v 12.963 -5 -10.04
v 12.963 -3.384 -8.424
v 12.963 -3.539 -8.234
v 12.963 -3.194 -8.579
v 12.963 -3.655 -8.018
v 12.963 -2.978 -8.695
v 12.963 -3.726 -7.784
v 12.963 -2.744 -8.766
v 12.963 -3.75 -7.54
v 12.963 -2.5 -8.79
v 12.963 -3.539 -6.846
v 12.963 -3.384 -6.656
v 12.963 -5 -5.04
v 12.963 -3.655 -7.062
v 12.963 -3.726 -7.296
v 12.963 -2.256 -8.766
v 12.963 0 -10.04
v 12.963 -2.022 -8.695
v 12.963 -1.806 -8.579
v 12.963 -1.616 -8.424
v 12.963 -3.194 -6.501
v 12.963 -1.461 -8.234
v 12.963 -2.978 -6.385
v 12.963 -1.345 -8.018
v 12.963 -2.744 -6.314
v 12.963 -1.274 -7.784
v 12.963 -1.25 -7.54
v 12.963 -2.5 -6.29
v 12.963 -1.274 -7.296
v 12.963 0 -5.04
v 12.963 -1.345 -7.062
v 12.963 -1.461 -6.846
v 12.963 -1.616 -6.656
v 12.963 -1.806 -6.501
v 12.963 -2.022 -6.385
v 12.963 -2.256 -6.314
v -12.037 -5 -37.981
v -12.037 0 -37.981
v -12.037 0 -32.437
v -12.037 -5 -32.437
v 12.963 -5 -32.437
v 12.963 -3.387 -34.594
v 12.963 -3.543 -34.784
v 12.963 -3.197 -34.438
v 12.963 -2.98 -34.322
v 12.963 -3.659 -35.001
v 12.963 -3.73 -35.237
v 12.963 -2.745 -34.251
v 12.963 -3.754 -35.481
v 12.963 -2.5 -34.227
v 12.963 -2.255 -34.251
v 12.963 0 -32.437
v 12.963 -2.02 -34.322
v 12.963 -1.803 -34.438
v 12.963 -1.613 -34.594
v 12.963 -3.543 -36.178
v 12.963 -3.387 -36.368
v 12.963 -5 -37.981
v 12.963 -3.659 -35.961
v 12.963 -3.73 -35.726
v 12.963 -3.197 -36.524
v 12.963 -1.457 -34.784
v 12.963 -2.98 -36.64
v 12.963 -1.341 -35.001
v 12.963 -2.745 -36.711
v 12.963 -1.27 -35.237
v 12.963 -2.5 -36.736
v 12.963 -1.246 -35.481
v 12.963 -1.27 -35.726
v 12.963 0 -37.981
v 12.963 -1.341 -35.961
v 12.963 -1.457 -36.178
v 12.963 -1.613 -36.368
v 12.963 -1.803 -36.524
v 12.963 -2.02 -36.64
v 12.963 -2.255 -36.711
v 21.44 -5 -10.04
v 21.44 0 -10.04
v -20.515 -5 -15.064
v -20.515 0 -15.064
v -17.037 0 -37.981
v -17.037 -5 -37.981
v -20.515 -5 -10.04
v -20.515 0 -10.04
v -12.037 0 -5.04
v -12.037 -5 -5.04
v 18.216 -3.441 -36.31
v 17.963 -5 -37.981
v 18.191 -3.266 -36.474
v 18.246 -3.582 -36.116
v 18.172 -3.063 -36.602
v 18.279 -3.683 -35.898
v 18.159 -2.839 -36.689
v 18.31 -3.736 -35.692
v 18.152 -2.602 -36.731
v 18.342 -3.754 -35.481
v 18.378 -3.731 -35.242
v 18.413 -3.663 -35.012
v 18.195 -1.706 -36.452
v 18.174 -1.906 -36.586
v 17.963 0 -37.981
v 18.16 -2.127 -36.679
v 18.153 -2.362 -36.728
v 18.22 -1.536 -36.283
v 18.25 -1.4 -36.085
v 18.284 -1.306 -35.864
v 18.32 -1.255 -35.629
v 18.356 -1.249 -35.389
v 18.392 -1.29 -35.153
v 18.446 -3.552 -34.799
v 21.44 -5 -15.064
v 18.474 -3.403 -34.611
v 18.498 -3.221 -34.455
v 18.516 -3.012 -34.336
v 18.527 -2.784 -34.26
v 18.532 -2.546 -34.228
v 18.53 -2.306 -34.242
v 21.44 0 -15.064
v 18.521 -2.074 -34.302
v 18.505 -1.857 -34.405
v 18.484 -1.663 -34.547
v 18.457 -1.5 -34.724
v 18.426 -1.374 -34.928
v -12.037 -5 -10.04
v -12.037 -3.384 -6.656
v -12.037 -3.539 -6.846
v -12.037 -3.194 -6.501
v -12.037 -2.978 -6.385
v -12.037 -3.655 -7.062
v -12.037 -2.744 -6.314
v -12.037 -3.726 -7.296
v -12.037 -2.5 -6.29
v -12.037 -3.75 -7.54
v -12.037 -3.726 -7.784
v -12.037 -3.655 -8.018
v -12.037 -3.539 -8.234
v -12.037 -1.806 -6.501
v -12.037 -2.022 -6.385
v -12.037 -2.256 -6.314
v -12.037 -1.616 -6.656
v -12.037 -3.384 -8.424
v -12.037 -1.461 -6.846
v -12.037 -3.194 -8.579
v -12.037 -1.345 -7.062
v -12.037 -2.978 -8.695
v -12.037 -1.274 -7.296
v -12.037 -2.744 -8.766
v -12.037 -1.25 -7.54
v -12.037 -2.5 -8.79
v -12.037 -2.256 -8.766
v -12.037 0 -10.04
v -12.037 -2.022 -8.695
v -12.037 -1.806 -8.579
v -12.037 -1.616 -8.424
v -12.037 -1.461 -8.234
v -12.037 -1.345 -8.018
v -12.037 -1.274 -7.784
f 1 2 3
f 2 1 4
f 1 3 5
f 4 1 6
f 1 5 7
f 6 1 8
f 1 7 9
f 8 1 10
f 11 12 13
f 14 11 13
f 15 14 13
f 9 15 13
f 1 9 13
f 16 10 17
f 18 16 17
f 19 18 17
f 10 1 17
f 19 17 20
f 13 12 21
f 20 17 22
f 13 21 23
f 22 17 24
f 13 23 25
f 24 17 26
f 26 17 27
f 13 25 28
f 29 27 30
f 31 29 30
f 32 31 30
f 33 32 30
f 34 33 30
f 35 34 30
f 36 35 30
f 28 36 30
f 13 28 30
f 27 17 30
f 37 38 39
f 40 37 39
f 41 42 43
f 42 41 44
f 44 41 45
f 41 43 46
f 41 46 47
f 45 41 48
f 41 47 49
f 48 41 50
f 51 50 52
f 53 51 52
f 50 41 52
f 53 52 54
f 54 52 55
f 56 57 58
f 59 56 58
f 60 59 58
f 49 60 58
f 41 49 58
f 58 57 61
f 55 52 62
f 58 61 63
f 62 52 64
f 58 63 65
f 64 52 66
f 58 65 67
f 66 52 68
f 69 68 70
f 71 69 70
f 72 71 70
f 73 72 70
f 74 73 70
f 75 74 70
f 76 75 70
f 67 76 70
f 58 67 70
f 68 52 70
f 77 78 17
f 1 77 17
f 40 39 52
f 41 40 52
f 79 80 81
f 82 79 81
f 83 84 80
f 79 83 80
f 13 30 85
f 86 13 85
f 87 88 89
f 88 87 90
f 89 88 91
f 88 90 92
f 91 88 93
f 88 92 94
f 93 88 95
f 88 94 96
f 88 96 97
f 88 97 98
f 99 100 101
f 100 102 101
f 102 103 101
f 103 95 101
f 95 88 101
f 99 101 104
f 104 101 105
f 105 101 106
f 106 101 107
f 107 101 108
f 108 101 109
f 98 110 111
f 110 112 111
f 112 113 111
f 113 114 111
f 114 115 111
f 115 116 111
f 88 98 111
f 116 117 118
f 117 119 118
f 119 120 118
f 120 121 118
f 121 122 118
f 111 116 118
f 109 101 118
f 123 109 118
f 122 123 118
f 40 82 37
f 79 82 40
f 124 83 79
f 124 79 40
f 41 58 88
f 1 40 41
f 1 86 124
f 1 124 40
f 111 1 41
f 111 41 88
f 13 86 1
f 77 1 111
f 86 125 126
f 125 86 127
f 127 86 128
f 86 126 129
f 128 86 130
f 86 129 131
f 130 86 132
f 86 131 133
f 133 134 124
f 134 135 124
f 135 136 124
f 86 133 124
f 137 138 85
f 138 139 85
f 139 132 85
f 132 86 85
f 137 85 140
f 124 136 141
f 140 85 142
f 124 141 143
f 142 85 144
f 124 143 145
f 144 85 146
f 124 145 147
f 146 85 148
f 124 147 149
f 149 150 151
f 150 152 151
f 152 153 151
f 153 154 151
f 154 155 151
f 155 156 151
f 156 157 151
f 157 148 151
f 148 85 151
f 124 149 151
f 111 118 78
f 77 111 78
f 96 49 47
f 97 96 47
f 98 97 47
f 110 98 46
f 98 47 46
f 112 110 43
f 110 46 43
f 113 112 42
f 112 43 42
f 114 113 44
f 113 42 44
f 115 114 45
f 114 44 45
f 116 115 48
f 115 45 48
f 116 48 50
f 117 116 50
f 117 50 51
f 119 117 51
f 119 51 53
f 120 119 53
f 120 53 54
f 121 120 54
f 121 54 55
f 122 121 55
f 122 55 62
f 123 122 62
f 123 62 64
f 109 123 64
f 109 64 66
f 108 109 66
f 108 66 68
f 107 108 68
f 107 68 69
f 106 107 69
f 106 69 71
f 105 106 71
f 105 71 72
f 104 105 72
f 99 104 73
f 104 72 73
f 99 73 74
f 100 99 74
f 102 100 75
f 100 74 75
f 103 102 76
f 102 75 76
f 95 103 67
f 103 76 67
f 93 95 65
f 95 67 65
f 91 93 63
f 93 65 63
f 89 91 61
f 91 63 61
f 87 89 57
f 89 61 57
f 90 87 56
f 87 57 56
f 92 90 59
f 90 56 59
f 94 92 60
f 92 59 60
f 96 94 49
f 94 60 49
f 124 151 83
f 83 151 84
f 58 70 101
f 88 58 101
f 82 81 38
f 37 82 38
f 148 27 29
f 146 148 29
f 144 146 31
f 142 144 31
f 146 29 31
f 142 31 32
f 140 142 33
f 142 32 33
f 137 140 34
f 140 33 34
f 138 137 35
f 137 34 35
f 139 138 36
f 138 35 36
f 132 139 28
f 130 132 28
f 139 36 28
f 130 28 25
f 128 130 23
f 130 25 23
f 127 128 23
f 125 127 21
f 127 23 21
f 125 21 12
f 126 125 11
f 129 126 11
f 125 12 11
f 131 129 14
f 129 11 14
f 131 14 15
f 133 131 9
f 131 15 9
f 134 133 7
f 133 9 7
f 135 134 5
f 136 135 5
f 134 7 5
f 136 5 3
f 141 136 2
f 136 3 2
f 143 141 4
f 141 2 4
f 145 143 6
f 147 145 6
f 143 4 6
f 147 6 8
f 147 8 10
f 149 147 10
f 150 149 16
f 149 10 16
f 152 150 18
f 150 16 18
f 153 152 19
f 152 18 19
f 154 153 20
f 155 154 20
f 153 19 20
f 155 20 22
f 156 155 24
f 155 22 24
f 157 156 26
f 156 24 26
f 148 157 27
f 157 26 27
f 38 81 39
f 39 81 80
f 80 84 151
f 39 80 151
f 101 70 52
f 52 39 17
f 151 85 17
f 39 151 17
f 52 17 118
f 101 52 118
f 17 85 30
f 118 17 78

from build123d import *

# Parameters (mm, degrees)
F1_DEPTH = 5
F2_R     = 1.254284
F3_DEPTH = 25
F4_R     = 1.25
F5_DEPTH = 25


with BuildPart() as f1:
    # F0 (on Front) → F1 (new body)
    with BuildSketch(Plane.XZ):
        Polygon((-12.037362, -37.981261), (-12.037362, -32.436818), (12.962638, -32.436818), (12.962638, -37.981261), (17.962638, -37.981261), (21.440424, -15.064236), (21.440424, -10.040002), (12.962638, -10.040002), (12.962638, -5.040002), (-12.037362, -5.040002), (-12.037362, -10.040002), (-20.515148, -10.040002), (-20.515148, -15.064236), (-17.037362, -37.981261), align=None)
    extrude(amount=F1_DEPTH)

    # F2 (on face) → F3 (cut)
    with BuildSketch(Plane(origin=(12.962638, 0, 0), x_dir=(0, -1, 0), z_dir=(-1, 0, 0))):
        with Locations((2.5, -35.481261)):
            Circle(F2_R)
    extrude(amount=-F3_DEPTH, mode=Mode.SUBTRACT)

    # F4 (on face) → F5 (cut)
    with BuildSketch(Plane.YZ.offset(12.962638)):
        with Locations((-2.5, -7.540002)):
            Circle(F4_R)
    extrude(amount=-F5_DEPTH, mode=Mode.SUBTRACT)


solid = f1.part
